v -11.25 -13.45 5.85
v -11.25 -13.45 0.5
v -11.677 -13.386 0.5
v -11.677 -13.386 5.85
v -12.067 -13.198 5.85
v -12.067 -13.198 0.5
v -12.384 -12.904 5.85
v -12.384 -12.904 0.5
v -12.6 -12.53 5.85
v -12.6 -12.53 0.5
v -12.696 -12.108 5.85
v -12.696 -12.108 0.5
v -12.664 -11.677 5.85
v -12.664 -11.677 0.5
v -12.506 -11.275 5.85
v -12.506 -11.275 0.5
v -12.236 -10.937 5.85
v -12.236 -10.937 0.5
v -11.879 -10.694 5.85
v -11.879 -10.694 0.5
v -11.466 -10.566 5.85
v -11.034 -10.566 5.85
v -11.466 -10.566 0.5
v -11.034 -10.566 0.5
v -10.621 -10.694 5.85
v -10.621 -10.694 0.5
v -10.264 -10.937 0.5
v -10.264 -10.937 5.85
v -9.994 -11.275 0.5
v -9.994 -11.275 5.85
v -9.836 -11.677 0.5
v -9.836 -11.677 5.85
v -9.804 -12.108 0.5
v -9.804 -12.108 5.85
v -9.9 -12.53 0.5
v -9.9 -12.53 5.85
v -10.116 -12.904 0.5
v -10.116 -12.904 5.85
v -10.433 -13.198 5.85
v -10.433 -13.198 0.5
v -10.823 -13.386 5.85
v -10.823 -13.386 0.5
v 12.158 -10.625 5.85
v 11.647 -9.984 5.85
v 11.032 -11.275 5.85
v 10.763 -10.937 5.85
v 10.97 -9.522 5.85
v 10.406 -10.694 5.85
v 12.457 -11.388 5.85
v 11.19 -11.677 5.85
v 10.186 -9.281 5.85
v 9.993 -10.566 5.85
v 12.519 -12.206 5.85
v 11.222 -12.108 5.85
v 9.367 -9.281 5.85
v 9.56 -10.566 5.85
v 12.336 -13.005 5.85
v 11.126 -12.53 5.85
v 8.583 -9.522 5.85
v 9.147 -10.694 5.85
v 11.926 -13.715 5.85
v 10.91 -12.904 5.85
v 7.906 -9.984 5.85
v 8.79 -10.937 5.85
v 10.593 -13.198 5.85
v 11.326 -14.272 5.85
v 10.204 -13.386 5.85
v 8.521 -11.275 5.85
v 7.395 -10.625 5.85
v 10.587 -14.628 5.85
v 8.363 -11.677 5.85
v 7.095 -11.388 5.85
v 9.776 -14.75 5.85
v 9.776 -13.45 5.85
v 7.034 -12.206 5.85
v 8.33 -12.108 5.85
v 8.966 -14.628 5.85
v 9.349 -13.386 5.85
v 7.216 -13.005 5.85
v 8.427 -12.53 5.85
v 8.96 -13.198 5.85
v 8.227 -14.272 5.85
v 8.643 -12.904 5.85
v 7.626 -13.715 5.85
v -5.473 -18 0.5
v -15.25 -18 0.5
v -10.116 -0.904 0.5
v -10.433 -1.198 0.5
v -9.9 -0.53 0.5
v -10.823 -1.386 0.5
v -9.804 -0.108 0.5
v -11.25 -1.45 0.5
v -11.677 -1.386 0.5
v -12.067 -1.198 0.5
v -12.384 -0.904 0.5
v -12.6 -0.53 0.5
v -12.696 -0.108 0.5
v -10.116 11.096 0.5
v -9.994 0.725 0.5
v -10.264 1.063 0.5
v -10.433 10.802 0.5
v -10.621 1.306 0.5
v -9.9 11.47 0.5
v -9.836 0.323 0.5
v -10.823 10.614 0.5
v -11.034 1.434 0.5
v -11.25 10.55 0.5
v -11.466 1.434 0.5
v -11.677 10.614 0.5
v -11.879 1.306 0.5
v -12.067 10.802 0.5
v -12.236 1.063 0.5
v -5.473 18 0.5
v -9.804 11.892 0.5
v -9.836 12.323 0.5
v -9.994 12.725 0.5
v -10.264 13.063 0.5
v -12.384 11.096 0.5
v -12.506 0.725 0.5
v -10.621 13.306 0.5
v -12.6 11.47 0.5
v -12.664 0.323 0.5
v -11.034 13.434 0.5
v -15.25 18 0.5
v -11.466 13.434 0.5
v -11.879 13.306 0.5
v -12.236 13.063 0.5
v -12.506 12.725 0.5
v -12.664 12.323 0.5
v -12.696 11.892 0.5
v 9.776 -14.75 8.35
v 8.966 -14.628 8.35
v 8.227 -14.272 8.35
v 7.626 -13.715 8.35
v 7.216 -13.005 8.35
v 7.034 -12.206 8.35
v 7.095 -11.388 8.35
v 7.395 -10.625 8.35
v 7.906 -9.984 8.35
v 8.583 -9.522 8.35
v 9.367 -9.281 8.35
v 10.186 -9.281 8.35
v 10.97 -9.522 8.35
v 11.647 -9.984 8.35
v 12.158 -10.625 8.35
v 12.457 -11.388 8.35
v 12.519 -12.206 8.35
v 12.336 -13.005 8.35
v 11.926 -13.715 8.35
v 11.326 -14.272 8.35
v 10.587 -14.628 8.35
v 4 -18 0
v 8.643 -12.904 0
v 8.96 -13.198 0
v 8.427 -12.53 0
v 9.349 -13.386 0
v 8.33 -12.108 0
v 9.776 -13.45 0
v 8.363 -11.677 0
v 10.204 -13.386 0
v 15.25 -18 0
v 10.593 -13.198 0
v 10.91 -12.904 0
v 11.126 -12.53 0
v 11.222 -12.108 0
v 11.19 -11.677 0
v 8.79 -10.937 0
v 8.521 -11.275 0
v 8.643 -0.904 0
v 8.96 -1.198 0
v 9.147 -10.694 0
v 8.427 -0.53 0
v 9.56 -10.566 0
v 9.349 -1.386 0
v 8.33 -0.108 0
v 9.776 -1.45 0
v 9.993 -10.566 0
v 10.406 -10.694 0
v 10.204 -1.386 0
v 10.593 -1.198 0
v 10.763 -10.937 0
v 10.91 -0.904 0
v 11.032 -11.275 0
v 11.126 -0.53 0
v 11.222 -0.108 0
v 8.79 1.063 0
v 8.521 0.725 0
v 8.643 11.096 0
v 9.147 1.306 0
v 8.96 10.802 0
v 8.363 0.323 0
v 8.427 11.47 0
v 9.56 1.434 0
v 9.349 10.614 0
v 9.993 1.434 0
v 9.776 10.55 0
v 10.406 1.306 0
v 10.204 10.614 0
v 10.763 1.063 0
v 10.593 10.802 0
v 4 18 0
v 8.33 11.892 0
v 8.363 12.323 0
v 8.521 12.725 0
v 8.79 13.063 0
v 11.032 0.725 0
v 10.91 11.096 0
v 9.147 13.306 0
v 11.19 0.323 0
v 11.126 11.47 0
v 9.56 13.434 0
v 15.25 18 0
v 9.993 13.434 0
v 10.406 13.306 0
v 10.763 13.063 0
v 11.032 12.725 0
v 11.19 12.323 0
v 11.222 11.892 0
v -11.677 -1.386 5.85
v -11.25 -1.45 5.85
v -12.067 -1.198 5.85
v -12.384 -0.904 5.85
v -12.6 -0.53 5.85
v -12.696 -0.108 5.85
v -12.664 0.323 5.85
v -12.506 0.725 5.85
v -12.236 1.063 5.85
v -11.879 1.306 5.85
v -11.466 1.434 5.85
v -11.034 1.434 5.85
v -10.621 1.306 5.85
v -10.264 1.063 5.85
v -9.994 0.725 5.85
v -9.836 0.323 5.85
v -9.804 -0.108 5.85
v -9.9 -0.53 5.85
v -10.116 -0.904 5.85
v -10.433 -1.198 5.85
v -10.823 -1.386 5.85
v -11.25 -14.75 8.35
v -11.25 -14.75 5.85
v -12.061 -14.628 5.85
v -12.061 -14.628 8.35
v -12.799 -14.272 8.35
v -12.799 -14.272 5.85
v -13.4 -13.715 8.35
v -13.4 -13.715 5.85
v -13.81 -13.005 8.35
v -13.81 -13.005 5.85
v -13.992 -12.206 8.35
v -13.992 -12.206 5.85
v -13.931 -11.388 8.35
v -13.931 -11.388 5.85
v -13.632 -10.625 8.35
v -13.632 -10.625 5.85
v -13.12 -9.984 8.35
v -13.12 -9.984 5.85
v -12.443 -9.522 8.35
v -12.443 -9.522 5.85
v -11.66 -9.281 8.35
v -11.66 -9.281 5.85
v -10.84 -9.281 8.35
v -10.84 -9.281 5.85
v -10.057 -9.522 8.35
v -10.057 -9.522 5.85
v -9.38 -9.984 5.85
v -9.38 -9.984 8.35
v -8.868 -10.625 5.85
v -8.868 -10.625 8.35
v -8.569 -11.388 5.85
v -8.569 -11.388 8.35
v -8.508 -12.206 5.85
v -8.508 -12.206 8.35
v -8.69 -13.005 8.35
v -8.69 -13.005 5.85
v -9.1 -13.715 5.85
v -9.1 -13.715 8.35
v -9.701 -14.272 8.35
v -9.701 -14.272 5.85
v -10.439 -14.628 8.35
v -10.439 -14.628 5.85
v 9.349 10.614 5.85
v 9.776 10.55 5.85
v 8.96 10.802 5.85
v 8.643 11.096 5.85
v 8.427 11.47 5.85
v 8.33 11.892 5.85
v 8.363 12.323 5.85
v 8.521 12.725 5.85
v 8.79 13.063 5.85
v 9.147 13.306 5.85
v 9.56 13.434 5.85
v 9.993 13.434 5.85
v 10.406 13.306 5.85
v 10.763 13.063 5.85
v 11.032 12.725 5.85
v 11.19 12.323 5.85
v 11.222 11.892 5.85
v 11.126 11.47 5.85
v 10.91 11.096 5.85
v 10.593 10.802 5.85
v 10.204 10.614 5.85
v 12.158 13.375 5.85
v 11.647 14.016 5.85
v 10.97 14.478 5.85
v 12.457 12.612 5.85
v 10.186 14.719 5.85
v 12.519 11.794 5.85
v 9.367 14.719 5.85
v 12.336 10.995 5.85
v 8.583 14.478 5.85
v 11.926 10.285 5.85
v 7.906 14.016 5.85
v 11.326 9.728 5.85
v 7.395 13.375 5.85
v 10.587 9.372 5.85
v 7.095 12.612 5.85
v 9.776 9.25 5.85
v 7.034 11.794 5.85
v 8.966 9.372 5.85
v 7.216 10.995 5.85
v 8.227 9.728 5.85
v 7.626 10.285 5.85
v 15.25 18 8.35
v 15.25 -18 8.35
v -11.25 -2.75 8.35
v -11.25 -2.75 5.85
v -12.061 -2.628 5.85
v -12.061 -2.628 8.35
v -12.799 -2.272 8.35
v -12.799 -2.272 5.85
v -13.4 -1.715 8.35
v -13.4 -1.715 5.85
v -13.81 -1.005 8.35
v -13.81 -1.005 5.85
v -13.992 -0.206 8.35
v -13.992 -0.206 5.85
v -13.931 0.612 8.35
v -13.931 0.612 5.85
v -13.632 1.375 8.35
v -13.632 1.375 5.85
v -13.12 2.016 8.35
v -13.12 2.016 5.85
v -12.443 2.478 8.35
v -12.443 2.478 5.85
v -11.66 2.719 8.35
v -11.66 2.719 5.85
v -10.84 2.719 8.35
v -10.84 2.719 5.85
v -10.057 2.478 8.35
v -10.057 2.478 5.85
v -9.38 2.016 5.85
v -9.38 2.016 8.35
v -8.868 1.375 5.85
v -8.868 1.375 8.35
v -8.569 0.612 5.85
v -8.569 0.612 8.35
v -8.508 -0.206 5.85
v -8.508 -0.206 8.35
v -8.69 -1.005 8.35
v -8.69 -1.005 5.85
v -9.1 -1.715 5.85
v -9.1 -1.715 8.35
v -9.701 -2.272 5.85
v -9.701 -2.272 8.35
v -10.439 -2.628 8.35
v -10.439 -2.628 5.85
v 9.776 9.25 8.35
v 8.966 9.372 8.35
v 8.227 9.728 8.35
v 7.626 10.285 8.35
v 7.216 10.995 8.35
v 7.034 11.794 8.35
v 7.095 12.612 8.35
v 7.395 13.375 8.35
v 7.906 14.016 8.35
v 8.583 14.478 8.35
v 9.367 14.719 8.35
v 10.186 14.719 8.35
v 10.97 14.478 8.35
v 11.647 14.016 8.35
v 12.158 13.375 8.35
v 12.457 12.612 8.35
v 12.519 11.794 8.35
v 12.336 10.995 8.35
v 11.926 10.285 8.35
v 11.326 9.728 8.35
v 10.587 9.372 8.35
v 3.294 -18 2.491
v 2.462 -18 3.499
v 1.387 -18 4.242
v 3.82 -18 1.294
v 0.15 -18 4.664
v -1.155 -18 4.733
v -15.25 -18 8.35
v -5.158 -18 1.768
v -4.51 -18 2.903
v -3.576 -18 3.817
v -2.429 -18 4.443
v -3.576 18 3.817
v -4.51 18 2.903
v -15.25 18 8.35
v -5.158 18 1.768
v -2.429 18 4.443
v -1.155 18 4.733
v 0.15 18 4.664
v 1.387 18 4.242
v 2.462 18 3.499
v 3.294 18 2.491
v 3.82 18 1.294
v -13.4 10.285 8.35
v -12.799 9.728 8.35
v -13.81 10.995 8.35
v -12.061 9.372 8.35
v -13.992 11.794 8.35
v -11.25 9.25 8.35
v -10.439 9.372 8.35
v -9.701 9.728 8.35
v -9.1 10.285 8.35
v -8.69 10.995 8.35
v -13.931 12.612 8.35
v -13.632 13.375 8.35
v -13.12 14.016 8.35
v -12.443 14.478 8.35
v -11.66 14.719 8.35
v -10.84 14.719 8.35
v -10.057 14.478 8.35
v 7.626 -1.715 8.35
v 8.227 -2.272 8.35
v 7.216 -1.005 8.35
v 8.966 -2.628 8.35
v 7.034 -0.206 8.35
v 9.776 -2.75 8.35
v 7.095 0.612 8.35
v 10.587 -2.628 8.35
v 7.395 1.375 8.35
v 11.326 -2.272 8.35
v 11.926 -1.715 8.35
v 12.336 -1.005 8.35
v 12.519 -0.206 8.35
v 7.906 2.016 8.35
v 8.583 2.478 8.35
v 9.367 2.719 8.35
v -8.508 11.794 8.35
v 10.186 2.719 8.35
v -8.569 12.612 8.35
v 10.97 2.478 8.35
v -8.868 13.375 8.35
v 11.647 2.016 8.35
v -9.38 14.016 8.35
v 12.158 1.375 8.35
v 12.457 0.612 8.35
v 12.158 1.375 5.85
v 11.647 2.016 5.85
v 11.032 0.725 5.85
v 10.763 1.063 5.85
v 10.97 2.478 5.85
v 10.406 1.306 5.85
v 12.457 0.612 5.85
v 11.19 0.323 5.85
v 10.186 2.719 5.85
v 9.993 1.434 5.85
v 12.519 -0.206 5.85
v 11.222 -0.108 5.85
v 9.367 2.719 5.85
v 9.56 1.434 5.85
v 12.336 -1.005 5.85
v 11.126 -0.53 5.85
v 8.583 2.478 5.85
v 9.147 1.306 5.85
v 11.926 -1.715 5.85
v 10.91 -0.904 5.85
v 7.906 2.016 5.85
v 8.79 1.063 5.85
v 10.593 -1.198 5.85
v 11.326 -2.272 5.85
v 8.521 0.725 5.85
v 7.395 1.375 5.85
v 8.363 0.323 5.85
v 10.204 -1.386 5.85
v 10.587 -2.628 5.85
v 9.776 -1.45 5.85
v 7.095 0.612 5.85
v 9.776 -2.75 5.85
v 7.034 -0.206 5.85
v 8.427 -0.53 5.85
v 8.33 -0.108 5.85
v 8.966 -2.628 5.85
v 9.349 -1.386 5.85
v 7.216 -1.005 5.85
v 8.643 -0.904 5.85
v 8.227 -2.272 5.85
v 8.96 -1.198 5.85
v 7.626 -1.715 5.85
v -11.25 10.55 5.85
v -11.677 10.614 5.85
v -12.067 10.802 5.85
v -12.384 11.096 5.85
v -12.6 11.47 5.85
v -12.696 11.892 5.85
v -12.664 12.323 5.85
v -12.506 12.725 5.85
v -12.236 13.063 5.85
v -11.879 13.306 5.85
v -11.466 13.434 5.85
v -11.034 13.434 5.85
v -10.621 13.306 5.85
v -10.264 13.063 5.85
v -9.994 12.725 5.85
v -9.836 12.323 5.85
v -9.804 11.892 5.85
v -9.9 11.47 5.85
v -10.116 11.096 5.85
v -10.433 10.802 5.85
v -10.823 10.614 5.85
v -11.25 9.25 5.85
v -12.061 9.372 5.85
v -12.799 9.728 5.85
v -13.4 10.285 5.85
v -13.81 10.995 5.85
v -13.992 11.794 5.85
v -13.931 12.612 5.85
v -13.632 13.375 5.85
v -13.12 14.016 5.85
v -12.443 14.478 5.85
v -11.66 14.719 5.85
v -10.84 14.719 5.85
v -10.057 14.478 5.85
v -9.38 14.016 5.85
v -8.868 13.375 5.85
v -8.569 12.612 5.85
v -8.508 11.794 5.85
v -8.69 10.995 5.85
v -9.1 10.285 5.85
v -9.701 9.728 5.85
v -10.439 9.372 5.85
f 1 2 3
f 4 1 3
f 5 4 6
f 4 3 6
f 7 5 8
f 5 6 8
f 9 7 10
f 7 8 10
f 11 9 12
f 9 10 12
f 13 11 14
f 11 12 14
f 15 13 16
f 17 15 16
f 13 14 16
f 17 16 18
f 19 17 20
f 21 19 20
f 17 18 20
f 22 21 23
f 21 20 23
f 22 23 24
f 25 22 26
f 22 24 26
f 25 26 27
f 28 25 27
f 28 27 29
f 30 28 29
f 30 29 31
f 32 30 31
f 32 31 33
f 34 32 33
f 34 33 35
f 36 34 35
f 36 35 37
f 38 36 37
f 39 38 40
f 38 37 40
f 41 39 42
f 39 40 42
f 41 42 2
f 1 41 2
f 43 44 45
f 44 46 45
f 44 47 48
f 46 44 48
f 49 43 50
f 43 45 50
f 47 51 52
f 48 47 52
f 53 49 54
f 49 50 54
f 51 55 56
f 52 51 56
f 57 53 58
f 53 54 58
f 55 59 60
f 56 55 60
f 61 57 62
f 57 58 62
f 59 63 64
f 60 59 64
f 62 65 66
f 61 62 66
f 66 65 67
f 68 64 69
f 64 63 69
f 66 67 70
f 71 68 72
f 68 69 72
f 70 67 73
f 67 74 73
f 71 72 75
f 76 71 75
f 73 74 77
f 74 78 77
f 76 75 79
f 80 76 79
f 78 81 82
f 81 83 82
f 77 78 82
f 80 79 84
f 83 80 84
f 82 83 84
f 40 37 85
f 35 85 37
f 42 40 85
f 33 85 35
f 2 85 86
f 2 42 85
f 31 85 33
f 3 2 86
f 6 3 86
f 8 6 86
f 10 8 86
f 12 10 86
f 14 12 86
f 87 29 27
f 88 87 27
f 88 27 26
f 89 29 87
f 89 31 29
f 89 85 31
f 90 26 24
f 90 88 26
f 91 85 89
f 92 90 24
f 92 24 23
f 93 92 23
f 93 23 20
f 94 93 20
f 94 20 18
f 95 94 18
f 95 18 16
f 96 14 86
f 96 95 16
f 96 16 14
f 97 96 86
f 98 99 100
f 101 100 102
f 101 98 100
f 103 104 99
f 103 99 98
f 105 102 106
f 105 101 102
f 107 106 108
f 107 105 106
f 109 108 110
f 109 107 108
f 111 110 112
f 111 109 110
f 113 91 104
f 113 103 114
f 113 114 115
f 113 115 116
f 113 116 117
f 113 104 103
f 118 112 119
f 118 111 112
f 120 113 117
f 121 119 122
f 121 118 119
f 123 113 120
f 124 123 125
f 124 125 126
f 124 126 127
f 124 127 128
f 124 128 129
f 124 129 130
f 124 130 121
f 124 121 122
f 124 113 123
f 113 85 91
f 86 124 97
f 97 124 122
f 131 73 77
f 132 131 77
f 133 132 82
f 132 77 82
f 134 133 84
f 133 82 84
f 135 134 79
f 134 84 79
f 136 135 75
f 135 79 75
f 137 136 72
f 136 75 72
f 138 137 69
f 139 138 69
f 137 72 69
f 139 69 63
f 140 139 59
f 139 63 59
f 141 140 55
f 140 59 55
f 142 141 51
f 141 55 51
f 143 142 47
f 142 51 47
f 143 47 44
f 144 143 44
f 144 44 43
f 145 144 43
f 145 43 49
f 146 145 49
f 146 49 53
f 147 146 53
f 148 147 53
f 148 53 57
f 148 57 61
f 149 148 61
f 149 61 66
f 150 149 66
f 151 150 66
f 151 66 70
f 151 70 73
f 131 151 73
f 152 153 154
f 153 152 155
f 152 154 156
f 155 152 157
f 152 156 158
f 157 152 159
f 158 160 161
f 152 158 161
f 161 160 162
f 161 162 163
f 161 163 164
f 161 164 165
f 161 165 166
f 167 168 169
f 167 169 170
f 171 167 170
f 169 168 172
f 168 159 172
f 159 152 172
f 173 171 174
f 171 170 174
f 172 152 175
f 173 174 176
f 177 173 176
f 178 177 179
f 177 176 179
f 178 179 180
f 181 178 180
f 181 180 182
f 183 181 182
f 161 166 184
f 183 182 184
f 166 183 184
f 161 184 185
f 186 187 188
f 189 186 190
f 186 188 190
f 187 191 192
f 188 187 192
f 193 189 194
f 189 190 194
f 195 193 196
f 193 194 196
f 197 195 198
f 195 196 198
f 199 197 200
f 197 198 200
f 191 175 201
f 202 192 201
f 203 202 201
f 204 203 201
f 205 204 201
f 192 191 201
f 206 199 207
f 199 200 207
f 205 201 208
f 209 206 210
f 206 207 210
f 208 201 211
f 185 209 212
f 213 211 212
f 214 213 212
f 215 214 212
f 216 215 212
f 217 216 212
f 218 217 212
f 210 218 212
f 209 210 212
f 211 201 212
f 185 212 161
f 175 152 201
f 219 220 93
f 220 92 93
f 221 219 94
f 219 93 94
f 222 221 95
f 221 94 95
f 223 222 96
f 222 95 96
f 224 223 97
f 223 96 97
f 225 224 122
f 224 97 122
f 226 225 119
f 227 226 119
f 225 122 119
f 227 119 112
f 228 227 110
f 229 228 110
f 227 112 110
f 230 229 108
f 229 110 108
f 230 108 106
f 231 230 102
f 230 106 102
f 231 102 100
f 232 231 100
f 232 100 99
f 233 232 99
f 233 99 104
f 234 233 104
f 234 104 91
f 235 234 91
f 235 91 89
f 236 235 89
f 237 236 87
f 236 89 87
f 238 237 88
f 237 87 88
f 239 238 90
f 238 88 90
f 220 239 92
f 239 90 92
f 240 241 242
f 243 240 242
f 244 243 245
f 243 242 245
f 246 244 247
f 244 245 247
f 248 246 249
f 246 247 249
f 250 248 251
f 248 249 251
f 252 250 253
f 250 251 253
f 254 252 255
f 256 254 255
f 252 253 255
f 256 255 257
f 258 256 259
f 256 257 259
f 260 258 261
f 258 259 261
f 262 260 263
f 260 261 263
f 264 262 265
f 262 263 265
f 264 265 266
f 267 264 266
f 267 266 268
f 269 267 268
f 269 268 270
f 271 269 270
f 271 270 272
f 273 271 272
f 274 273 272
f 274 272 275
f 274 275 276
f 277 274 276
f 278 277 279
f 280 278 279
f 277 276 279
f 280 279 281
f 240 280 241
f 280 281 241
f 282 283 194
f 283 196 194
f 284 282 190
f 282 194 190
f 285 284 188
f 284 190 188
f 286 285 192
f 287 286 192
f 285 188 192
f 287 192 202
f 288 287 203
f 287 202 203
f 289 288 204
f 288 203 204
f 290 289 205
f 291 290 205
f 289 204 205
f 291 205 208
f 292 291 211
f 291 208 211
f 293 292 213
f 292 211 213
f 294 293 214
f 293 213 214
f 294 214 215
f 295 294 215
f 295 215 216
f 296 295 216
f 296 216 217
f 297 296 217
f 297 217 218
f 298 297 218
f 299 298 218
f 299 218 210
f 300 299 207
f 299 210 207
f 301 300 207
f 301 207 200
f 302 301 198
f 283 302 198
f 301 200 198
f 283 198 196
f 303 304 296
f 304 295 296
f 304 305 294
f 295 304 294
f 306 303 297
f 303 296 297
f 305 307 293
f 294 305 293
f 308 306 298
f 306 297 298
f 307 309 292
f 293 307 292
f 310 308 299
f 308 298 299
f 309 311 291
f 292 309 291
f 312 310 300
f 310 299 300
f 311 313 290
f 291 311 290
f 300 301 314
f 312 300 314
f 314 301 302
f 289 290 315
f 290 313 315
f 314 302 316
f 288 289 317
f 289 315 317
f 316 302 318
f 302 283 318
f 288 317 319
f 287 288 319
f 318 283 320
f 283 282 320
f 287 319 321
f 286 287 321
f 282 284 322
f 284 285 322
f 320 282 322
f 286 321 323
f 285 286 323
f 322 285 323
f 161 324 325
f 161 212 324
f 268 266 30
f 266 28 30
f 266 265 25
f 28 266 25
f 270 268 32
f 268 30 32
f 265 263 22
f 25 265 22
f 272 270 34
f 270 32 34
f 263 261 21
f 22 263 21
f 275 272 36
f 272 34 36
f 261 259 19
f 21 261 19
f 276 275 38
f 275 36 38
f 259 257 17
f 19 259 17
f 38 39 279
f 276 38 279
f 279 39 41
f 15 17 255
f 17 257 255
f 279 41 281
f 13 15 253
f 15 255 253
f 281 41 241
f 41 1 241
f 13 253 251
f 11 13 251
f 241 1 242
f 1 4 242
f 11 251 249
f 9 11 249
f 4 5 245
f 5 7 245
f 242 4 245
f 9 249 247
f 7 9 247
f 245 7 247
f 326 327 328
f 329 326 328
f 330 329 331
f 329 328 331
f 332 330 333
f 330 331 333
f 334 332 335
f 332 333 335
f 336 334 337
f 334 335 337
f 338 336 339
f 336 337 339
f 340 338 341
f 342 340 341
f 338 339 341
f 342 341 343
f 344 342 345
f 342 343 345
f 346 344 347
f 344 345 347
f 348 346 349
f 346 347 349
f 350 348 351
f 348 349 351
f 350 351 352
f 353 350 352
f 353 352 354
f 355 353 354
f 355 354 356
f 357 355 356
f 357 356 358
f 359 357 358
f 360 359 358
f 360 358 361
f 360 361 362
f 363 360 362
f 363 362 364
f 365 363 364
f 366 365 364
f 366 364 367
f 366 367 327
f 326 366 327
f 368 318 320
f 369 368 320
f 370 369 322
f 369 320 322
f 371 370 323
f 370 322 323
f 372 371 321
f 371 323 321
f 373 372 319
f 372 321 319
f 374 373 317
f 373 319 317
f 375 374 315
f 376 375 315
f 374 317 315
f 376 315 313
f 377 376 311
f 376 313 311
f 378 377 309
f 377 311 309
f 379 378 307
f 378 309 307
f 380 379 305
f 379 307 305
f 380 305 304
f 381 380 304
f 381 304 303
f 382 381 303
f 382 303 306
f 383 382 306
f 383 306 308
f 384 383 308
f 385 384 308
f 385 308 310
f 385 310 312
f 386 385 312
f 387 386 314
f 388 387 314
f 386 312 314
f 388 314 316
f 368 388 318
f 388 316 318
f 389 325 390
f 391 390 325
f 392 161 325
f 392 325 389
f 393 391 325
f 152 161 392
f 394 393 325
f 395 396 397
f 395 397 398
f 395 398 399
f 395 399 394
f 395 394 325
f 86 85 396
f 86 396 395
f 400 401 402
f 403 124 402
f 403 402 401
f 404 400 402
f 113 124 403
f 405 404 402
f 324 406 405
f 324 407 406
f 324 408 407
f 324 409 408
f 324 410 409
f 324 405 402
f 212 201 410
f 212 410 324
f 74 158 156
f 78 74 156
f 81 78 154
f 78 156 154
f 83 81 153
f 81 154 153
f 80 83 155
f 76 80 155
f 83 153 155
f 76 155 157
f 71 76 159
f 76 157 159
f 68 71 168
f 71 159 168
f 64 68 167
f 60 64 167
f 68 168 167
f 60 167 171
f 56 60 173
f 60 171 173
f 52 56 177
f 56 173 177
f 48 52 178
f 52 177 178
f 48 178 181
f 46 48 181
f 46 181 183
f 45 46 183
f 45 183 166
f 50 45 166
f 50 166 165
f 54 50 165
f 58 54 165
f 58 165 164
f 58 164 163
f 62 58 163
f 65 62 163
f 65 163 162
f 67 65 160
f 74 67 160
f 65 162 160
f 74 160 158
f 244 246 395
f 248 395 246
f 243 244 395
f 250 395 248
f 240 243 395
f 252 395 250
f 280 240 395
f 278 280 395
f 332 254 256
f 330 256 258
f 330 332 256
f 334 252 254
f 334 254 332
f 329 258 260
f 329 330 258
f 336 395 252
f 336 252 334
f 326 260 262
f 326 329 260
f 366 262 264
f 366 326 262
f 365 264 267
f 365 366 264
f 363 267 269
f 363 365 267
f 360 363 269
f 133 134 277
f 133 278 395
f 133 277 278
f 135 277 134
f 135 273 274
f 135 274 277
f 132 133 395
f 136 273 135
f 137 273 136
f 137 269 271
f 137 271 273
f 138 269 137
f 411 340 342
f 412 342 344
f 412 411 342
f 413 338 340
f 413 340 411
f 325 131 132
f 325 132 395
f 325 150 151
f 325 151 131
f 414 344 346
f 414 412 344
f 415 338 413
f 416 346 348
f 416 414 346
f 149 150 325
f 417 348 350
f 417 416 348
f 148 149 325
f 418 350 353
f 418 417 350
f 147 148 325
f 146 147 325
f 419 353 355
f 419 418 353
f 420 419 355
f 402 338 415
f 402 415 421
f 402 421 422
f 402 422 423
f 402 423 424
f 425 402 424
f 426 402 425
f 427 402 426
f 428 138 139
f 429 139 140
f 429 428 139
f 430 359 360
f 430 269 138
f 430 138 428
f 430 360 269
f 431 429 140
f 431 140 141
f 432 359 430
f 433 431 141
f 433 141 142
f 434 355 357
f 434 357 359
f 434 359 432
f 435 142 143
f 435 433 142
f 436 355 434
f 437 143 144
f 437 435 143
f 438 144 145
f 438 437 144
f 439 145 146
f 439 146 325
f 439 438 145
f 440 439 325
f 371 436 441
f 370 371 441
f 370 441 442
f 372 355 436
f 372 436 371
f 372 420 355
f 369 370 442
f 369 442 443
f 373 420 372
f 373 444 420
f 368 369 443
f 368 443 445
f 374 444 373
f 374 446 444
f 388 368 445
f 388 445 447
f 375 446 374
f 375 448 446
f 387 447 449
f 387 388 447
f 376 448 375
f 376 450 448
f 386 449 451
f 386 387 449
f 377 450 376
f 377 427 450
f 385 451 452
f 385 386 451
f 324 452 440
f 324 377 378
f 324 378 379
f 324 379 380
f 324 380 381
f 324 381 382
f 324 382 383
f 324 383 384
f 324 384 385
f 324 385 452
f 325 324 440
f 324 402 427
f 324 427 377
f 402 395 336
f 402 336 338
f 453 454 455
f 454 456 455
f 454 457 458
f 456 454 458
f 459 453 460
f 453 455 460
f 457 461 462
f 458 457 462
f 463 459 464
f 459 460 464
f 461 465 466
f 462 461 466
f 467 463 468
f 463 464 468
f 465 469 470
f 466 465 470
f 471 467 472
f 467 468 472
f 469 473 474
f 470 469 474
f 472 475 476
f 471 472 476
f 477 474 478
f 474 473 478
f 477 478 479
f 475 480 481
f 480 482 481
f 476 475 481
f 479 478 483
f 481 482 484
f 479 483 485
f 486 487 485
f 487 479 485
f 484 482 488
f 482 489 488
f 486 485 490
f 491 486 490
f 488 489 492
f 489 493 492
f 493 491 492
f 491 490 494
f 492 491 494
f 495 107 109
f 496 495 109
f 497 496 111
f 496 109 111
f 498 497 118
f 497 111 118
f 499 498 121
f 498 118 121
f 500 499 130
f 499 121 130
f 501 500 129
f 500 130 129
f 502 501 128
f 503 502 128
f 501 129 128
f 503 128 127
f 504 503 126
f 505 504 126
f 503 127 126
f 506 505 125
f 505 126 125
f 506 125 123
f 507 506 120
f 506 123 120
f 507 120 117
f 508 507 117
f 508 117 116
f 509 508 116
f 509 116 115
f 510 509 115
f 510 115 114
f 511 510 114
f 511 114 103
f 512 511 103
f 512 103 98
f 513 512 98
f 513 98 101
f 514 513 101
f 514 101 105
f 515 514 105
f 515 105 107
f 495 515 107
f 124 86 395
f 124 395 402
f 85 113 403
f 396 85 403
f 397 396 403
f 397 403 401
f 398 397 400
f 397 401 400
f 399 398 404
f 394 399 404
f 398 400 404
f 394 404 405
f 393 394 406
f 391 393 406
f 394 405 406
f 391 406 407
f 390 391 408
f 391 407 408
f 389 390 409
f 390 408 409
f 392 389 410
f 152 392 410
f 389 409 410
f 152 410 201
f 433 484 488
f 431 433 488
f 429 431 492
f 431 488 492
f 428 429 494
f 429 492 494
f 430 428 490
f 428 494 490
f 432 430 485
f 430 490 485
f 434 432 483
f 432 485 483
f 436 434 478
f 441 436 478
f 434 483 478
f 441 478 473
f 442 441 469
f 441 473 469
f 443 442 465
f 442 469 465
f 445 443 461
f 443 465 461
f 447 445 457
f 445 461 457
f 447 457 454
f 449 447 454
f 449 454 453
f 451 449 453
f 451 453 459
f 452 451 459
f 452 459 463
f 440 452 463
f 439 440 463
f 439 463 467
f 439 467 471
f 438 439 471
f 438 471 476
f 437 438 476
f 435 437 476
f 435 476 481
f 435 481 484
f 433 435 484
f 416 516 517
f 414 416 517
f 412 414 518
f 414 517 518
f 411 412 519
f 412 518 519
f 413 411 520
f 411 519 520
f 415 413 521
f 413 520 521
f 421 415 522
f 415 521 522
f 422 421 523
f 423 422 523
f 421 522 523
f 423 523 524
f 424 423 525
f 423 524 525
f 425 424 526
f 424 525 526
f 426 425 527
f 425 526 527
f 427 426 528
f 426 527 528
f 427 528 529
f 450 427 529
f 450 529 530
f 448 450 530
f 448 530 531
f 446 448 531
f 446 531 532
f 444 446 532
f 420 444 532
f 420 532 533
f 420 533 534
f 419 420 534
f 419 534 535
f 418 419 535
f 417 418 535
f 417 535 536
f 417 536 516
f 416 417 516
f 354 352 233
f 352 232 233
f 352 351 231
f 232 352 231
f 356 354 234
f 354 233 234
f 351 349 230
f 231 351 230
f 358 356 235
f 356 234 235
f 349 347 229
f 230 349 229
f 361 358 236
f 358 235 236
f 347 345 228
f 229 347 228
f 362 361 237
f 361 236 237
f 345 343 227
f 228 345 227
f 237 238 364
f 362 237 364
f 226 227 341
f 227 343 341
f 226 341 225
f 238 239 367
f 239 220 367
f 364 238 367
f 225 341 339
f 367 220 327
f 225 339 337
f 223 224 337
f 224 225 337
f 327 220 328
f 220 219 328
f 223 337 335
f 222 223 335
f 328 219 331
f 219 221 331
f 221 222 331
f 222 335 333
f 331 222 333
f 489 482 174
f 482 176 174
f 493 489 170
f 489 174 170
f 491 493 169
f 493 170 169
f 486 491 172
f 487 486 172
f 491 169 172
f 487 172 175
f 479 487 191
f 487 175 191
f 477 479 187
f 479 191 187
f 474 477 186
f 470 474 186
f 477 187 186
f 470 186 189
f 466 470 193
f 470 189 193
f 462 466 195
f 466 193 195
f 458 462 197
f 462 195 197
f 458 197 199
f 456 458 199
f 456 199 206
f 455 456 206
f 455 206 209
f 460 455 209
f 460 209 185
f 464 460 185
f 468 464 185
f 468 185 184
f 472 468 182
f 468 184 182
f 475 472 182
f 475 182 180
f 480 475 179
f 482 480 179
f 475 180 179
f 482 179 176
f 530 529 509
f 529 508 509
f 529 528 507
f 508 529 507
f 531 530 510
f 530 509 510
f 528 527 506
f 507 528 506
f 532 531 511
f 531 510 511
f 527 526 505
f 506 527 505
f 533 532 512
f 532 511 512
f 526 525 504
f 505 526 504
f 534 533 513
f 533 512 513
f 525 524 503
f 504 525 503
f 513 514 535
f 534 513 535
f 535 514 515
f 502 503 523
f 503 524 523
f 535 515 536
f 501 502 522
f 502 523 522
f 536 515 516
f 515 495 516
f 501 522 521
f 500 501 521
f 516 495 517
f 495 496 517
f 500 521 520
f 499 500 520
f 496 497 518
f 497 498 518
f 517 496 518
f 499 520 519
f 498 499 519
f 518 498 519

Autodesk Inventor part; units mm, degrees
ref_plane "YZ Plane" through (0, 0, 0) normal (1, 0, 0) x (0, 1, 0)
ref_plane "XZ Plane" through (0, 0, 0) normal (0, 1, 0) x (-1, 0, 0)
ref_plane "XY Plane" through (0, 0, 0) normal (0, 0, 1) x (1, 0, 0)
sketch "Sketch1" plane through (0, 0, 0) normal (0, 0, 1) x (1, 0, 0)
  line L0 (-15.25, 18) -> (15.25, 18)
  line L1 (15.25, 18) -> (15.25, -18)
  line L2 (15.25, -18) -> (-15.25, -18)
  line L3 (-15.25, -18) -> (-15.25, 18)
  point P0 (0, 0)
  dimension "d0" = 30.5
  dimension "d1" = 36
  dimension "d2" = 18
  dimension "d3" = 15.25
extrude "Extrusion1" add sketch "Sketch1" along normal blind 8.35
sketch "Sketch2" plane through (-15.25, 18, 0) normal (0, 1, 0) x (1, 0, 0)
  line L0 (30.5, 0) -> (30.5, -8.35) projected
  line L1 (30.5, -8.35) -> (70.5, -8.35) projected
  line L2 (70.5, 11.65) -> (70.5, -8.35) projected
  line L3 (0, 11.65) -> (70.5, 11.65) projected
  line L4 (0, 11.65) -> (0, 0.5) projected
  line L5 (0, 0.5) -> (9.7766, 0.5) projected
  arc A0 (19.2498, 0) -> (9.7766, 0.5) centre (14.5, 0) ccw projected
  line L6 (19.2498, 0) -> (30.5, 0) projected
  circle A1 centre (40.5, 1.65) radius 0.847 projected
  circle A2 centre (62.5, 1.65) radius 0.847 projected
  circle A3 centre (54.5, 1.65) radius 4 projected
  circle A4 centre (14.5, 0) radius 4.7498
  point P0 (15.25, 0)
extrude "Extrusion2" cut sketch "Sketch2" against normal through all contours A4 A0
sketch "Sketch3" plane through (0, 0, 8.35) normal (0, 0, 1) x (1, 0, 0)
  circle A0 centre (-11.25, 12) radius 1.0065 projected
  circle A1 centre (-11.25, 0) radius 1.0065 projected
  circle A2 centre (-11.25, -12) radius 1.0065 projected
  circle A3 centre (9.7764, 12) radius 1.0065 projected
  circle A4 centre (9.7764, 0) radius 1.0065 projected
  circle A5 centre (9.7764, -12) radius 1.0065 projected
  point P0 (0, 0)
hole "CBore for M2.5 screw" at (-11.25, -12, 8.35) at (-11.25, 0, 8.35) at (-11.25, 12, 8.35) at (9.7764, -12, 8.35) at (9.7764, 0, 8.35) at (9.7764, 12, 8.35) direction (0, 0, -1) diameter 2.9 end through all counterbore diameter 5.5 counterbore depth 2.5 clearance for "Socket Head Cap Screw" size "M2.5" standard "Ansi Metric M Profile"
sketch "Sketch4" plane through (0, 0, 0) normal (0, 0, -1) x (-1, 0, 0)
  circle A0 centre (11.25, 0) radius 1.45 projected
  circle A1 centre (11.25, -12) radius 1.45 projected
  circle A2 centre (11.25, 12) radius 1.45 projected
  line L0 (5.4998, 18) -> (5.4998, -18) projected
  line L1 (5.4998, -18) -> (15.25, -18) projected
  line L2 (15.25, -18) -> (15.25, 18) projected
  line L3 (15.25, 18) -> (5.4998, 18) projected
  line L4 (15.25, -18) -> (4.4998, -18)
  line L5 (4.4998, -18) -> (4.4998, 18)
  line L6 (4.4998, 18) -> (15.25, 18)
  line L7 (15.25, 18) -> (15.25, -18)
  point P0 (0, 0)
  dimension "d17" = 1
extrude "Extrusion3" cut sketch "Sketch4" against normal blind 0.5
equation "\"d2\" = 0.5 * d1"
equation "\"d3\" = 0.5 * d0"
properties part number "J007580" material "ALUMINUM, 6061-T651"
